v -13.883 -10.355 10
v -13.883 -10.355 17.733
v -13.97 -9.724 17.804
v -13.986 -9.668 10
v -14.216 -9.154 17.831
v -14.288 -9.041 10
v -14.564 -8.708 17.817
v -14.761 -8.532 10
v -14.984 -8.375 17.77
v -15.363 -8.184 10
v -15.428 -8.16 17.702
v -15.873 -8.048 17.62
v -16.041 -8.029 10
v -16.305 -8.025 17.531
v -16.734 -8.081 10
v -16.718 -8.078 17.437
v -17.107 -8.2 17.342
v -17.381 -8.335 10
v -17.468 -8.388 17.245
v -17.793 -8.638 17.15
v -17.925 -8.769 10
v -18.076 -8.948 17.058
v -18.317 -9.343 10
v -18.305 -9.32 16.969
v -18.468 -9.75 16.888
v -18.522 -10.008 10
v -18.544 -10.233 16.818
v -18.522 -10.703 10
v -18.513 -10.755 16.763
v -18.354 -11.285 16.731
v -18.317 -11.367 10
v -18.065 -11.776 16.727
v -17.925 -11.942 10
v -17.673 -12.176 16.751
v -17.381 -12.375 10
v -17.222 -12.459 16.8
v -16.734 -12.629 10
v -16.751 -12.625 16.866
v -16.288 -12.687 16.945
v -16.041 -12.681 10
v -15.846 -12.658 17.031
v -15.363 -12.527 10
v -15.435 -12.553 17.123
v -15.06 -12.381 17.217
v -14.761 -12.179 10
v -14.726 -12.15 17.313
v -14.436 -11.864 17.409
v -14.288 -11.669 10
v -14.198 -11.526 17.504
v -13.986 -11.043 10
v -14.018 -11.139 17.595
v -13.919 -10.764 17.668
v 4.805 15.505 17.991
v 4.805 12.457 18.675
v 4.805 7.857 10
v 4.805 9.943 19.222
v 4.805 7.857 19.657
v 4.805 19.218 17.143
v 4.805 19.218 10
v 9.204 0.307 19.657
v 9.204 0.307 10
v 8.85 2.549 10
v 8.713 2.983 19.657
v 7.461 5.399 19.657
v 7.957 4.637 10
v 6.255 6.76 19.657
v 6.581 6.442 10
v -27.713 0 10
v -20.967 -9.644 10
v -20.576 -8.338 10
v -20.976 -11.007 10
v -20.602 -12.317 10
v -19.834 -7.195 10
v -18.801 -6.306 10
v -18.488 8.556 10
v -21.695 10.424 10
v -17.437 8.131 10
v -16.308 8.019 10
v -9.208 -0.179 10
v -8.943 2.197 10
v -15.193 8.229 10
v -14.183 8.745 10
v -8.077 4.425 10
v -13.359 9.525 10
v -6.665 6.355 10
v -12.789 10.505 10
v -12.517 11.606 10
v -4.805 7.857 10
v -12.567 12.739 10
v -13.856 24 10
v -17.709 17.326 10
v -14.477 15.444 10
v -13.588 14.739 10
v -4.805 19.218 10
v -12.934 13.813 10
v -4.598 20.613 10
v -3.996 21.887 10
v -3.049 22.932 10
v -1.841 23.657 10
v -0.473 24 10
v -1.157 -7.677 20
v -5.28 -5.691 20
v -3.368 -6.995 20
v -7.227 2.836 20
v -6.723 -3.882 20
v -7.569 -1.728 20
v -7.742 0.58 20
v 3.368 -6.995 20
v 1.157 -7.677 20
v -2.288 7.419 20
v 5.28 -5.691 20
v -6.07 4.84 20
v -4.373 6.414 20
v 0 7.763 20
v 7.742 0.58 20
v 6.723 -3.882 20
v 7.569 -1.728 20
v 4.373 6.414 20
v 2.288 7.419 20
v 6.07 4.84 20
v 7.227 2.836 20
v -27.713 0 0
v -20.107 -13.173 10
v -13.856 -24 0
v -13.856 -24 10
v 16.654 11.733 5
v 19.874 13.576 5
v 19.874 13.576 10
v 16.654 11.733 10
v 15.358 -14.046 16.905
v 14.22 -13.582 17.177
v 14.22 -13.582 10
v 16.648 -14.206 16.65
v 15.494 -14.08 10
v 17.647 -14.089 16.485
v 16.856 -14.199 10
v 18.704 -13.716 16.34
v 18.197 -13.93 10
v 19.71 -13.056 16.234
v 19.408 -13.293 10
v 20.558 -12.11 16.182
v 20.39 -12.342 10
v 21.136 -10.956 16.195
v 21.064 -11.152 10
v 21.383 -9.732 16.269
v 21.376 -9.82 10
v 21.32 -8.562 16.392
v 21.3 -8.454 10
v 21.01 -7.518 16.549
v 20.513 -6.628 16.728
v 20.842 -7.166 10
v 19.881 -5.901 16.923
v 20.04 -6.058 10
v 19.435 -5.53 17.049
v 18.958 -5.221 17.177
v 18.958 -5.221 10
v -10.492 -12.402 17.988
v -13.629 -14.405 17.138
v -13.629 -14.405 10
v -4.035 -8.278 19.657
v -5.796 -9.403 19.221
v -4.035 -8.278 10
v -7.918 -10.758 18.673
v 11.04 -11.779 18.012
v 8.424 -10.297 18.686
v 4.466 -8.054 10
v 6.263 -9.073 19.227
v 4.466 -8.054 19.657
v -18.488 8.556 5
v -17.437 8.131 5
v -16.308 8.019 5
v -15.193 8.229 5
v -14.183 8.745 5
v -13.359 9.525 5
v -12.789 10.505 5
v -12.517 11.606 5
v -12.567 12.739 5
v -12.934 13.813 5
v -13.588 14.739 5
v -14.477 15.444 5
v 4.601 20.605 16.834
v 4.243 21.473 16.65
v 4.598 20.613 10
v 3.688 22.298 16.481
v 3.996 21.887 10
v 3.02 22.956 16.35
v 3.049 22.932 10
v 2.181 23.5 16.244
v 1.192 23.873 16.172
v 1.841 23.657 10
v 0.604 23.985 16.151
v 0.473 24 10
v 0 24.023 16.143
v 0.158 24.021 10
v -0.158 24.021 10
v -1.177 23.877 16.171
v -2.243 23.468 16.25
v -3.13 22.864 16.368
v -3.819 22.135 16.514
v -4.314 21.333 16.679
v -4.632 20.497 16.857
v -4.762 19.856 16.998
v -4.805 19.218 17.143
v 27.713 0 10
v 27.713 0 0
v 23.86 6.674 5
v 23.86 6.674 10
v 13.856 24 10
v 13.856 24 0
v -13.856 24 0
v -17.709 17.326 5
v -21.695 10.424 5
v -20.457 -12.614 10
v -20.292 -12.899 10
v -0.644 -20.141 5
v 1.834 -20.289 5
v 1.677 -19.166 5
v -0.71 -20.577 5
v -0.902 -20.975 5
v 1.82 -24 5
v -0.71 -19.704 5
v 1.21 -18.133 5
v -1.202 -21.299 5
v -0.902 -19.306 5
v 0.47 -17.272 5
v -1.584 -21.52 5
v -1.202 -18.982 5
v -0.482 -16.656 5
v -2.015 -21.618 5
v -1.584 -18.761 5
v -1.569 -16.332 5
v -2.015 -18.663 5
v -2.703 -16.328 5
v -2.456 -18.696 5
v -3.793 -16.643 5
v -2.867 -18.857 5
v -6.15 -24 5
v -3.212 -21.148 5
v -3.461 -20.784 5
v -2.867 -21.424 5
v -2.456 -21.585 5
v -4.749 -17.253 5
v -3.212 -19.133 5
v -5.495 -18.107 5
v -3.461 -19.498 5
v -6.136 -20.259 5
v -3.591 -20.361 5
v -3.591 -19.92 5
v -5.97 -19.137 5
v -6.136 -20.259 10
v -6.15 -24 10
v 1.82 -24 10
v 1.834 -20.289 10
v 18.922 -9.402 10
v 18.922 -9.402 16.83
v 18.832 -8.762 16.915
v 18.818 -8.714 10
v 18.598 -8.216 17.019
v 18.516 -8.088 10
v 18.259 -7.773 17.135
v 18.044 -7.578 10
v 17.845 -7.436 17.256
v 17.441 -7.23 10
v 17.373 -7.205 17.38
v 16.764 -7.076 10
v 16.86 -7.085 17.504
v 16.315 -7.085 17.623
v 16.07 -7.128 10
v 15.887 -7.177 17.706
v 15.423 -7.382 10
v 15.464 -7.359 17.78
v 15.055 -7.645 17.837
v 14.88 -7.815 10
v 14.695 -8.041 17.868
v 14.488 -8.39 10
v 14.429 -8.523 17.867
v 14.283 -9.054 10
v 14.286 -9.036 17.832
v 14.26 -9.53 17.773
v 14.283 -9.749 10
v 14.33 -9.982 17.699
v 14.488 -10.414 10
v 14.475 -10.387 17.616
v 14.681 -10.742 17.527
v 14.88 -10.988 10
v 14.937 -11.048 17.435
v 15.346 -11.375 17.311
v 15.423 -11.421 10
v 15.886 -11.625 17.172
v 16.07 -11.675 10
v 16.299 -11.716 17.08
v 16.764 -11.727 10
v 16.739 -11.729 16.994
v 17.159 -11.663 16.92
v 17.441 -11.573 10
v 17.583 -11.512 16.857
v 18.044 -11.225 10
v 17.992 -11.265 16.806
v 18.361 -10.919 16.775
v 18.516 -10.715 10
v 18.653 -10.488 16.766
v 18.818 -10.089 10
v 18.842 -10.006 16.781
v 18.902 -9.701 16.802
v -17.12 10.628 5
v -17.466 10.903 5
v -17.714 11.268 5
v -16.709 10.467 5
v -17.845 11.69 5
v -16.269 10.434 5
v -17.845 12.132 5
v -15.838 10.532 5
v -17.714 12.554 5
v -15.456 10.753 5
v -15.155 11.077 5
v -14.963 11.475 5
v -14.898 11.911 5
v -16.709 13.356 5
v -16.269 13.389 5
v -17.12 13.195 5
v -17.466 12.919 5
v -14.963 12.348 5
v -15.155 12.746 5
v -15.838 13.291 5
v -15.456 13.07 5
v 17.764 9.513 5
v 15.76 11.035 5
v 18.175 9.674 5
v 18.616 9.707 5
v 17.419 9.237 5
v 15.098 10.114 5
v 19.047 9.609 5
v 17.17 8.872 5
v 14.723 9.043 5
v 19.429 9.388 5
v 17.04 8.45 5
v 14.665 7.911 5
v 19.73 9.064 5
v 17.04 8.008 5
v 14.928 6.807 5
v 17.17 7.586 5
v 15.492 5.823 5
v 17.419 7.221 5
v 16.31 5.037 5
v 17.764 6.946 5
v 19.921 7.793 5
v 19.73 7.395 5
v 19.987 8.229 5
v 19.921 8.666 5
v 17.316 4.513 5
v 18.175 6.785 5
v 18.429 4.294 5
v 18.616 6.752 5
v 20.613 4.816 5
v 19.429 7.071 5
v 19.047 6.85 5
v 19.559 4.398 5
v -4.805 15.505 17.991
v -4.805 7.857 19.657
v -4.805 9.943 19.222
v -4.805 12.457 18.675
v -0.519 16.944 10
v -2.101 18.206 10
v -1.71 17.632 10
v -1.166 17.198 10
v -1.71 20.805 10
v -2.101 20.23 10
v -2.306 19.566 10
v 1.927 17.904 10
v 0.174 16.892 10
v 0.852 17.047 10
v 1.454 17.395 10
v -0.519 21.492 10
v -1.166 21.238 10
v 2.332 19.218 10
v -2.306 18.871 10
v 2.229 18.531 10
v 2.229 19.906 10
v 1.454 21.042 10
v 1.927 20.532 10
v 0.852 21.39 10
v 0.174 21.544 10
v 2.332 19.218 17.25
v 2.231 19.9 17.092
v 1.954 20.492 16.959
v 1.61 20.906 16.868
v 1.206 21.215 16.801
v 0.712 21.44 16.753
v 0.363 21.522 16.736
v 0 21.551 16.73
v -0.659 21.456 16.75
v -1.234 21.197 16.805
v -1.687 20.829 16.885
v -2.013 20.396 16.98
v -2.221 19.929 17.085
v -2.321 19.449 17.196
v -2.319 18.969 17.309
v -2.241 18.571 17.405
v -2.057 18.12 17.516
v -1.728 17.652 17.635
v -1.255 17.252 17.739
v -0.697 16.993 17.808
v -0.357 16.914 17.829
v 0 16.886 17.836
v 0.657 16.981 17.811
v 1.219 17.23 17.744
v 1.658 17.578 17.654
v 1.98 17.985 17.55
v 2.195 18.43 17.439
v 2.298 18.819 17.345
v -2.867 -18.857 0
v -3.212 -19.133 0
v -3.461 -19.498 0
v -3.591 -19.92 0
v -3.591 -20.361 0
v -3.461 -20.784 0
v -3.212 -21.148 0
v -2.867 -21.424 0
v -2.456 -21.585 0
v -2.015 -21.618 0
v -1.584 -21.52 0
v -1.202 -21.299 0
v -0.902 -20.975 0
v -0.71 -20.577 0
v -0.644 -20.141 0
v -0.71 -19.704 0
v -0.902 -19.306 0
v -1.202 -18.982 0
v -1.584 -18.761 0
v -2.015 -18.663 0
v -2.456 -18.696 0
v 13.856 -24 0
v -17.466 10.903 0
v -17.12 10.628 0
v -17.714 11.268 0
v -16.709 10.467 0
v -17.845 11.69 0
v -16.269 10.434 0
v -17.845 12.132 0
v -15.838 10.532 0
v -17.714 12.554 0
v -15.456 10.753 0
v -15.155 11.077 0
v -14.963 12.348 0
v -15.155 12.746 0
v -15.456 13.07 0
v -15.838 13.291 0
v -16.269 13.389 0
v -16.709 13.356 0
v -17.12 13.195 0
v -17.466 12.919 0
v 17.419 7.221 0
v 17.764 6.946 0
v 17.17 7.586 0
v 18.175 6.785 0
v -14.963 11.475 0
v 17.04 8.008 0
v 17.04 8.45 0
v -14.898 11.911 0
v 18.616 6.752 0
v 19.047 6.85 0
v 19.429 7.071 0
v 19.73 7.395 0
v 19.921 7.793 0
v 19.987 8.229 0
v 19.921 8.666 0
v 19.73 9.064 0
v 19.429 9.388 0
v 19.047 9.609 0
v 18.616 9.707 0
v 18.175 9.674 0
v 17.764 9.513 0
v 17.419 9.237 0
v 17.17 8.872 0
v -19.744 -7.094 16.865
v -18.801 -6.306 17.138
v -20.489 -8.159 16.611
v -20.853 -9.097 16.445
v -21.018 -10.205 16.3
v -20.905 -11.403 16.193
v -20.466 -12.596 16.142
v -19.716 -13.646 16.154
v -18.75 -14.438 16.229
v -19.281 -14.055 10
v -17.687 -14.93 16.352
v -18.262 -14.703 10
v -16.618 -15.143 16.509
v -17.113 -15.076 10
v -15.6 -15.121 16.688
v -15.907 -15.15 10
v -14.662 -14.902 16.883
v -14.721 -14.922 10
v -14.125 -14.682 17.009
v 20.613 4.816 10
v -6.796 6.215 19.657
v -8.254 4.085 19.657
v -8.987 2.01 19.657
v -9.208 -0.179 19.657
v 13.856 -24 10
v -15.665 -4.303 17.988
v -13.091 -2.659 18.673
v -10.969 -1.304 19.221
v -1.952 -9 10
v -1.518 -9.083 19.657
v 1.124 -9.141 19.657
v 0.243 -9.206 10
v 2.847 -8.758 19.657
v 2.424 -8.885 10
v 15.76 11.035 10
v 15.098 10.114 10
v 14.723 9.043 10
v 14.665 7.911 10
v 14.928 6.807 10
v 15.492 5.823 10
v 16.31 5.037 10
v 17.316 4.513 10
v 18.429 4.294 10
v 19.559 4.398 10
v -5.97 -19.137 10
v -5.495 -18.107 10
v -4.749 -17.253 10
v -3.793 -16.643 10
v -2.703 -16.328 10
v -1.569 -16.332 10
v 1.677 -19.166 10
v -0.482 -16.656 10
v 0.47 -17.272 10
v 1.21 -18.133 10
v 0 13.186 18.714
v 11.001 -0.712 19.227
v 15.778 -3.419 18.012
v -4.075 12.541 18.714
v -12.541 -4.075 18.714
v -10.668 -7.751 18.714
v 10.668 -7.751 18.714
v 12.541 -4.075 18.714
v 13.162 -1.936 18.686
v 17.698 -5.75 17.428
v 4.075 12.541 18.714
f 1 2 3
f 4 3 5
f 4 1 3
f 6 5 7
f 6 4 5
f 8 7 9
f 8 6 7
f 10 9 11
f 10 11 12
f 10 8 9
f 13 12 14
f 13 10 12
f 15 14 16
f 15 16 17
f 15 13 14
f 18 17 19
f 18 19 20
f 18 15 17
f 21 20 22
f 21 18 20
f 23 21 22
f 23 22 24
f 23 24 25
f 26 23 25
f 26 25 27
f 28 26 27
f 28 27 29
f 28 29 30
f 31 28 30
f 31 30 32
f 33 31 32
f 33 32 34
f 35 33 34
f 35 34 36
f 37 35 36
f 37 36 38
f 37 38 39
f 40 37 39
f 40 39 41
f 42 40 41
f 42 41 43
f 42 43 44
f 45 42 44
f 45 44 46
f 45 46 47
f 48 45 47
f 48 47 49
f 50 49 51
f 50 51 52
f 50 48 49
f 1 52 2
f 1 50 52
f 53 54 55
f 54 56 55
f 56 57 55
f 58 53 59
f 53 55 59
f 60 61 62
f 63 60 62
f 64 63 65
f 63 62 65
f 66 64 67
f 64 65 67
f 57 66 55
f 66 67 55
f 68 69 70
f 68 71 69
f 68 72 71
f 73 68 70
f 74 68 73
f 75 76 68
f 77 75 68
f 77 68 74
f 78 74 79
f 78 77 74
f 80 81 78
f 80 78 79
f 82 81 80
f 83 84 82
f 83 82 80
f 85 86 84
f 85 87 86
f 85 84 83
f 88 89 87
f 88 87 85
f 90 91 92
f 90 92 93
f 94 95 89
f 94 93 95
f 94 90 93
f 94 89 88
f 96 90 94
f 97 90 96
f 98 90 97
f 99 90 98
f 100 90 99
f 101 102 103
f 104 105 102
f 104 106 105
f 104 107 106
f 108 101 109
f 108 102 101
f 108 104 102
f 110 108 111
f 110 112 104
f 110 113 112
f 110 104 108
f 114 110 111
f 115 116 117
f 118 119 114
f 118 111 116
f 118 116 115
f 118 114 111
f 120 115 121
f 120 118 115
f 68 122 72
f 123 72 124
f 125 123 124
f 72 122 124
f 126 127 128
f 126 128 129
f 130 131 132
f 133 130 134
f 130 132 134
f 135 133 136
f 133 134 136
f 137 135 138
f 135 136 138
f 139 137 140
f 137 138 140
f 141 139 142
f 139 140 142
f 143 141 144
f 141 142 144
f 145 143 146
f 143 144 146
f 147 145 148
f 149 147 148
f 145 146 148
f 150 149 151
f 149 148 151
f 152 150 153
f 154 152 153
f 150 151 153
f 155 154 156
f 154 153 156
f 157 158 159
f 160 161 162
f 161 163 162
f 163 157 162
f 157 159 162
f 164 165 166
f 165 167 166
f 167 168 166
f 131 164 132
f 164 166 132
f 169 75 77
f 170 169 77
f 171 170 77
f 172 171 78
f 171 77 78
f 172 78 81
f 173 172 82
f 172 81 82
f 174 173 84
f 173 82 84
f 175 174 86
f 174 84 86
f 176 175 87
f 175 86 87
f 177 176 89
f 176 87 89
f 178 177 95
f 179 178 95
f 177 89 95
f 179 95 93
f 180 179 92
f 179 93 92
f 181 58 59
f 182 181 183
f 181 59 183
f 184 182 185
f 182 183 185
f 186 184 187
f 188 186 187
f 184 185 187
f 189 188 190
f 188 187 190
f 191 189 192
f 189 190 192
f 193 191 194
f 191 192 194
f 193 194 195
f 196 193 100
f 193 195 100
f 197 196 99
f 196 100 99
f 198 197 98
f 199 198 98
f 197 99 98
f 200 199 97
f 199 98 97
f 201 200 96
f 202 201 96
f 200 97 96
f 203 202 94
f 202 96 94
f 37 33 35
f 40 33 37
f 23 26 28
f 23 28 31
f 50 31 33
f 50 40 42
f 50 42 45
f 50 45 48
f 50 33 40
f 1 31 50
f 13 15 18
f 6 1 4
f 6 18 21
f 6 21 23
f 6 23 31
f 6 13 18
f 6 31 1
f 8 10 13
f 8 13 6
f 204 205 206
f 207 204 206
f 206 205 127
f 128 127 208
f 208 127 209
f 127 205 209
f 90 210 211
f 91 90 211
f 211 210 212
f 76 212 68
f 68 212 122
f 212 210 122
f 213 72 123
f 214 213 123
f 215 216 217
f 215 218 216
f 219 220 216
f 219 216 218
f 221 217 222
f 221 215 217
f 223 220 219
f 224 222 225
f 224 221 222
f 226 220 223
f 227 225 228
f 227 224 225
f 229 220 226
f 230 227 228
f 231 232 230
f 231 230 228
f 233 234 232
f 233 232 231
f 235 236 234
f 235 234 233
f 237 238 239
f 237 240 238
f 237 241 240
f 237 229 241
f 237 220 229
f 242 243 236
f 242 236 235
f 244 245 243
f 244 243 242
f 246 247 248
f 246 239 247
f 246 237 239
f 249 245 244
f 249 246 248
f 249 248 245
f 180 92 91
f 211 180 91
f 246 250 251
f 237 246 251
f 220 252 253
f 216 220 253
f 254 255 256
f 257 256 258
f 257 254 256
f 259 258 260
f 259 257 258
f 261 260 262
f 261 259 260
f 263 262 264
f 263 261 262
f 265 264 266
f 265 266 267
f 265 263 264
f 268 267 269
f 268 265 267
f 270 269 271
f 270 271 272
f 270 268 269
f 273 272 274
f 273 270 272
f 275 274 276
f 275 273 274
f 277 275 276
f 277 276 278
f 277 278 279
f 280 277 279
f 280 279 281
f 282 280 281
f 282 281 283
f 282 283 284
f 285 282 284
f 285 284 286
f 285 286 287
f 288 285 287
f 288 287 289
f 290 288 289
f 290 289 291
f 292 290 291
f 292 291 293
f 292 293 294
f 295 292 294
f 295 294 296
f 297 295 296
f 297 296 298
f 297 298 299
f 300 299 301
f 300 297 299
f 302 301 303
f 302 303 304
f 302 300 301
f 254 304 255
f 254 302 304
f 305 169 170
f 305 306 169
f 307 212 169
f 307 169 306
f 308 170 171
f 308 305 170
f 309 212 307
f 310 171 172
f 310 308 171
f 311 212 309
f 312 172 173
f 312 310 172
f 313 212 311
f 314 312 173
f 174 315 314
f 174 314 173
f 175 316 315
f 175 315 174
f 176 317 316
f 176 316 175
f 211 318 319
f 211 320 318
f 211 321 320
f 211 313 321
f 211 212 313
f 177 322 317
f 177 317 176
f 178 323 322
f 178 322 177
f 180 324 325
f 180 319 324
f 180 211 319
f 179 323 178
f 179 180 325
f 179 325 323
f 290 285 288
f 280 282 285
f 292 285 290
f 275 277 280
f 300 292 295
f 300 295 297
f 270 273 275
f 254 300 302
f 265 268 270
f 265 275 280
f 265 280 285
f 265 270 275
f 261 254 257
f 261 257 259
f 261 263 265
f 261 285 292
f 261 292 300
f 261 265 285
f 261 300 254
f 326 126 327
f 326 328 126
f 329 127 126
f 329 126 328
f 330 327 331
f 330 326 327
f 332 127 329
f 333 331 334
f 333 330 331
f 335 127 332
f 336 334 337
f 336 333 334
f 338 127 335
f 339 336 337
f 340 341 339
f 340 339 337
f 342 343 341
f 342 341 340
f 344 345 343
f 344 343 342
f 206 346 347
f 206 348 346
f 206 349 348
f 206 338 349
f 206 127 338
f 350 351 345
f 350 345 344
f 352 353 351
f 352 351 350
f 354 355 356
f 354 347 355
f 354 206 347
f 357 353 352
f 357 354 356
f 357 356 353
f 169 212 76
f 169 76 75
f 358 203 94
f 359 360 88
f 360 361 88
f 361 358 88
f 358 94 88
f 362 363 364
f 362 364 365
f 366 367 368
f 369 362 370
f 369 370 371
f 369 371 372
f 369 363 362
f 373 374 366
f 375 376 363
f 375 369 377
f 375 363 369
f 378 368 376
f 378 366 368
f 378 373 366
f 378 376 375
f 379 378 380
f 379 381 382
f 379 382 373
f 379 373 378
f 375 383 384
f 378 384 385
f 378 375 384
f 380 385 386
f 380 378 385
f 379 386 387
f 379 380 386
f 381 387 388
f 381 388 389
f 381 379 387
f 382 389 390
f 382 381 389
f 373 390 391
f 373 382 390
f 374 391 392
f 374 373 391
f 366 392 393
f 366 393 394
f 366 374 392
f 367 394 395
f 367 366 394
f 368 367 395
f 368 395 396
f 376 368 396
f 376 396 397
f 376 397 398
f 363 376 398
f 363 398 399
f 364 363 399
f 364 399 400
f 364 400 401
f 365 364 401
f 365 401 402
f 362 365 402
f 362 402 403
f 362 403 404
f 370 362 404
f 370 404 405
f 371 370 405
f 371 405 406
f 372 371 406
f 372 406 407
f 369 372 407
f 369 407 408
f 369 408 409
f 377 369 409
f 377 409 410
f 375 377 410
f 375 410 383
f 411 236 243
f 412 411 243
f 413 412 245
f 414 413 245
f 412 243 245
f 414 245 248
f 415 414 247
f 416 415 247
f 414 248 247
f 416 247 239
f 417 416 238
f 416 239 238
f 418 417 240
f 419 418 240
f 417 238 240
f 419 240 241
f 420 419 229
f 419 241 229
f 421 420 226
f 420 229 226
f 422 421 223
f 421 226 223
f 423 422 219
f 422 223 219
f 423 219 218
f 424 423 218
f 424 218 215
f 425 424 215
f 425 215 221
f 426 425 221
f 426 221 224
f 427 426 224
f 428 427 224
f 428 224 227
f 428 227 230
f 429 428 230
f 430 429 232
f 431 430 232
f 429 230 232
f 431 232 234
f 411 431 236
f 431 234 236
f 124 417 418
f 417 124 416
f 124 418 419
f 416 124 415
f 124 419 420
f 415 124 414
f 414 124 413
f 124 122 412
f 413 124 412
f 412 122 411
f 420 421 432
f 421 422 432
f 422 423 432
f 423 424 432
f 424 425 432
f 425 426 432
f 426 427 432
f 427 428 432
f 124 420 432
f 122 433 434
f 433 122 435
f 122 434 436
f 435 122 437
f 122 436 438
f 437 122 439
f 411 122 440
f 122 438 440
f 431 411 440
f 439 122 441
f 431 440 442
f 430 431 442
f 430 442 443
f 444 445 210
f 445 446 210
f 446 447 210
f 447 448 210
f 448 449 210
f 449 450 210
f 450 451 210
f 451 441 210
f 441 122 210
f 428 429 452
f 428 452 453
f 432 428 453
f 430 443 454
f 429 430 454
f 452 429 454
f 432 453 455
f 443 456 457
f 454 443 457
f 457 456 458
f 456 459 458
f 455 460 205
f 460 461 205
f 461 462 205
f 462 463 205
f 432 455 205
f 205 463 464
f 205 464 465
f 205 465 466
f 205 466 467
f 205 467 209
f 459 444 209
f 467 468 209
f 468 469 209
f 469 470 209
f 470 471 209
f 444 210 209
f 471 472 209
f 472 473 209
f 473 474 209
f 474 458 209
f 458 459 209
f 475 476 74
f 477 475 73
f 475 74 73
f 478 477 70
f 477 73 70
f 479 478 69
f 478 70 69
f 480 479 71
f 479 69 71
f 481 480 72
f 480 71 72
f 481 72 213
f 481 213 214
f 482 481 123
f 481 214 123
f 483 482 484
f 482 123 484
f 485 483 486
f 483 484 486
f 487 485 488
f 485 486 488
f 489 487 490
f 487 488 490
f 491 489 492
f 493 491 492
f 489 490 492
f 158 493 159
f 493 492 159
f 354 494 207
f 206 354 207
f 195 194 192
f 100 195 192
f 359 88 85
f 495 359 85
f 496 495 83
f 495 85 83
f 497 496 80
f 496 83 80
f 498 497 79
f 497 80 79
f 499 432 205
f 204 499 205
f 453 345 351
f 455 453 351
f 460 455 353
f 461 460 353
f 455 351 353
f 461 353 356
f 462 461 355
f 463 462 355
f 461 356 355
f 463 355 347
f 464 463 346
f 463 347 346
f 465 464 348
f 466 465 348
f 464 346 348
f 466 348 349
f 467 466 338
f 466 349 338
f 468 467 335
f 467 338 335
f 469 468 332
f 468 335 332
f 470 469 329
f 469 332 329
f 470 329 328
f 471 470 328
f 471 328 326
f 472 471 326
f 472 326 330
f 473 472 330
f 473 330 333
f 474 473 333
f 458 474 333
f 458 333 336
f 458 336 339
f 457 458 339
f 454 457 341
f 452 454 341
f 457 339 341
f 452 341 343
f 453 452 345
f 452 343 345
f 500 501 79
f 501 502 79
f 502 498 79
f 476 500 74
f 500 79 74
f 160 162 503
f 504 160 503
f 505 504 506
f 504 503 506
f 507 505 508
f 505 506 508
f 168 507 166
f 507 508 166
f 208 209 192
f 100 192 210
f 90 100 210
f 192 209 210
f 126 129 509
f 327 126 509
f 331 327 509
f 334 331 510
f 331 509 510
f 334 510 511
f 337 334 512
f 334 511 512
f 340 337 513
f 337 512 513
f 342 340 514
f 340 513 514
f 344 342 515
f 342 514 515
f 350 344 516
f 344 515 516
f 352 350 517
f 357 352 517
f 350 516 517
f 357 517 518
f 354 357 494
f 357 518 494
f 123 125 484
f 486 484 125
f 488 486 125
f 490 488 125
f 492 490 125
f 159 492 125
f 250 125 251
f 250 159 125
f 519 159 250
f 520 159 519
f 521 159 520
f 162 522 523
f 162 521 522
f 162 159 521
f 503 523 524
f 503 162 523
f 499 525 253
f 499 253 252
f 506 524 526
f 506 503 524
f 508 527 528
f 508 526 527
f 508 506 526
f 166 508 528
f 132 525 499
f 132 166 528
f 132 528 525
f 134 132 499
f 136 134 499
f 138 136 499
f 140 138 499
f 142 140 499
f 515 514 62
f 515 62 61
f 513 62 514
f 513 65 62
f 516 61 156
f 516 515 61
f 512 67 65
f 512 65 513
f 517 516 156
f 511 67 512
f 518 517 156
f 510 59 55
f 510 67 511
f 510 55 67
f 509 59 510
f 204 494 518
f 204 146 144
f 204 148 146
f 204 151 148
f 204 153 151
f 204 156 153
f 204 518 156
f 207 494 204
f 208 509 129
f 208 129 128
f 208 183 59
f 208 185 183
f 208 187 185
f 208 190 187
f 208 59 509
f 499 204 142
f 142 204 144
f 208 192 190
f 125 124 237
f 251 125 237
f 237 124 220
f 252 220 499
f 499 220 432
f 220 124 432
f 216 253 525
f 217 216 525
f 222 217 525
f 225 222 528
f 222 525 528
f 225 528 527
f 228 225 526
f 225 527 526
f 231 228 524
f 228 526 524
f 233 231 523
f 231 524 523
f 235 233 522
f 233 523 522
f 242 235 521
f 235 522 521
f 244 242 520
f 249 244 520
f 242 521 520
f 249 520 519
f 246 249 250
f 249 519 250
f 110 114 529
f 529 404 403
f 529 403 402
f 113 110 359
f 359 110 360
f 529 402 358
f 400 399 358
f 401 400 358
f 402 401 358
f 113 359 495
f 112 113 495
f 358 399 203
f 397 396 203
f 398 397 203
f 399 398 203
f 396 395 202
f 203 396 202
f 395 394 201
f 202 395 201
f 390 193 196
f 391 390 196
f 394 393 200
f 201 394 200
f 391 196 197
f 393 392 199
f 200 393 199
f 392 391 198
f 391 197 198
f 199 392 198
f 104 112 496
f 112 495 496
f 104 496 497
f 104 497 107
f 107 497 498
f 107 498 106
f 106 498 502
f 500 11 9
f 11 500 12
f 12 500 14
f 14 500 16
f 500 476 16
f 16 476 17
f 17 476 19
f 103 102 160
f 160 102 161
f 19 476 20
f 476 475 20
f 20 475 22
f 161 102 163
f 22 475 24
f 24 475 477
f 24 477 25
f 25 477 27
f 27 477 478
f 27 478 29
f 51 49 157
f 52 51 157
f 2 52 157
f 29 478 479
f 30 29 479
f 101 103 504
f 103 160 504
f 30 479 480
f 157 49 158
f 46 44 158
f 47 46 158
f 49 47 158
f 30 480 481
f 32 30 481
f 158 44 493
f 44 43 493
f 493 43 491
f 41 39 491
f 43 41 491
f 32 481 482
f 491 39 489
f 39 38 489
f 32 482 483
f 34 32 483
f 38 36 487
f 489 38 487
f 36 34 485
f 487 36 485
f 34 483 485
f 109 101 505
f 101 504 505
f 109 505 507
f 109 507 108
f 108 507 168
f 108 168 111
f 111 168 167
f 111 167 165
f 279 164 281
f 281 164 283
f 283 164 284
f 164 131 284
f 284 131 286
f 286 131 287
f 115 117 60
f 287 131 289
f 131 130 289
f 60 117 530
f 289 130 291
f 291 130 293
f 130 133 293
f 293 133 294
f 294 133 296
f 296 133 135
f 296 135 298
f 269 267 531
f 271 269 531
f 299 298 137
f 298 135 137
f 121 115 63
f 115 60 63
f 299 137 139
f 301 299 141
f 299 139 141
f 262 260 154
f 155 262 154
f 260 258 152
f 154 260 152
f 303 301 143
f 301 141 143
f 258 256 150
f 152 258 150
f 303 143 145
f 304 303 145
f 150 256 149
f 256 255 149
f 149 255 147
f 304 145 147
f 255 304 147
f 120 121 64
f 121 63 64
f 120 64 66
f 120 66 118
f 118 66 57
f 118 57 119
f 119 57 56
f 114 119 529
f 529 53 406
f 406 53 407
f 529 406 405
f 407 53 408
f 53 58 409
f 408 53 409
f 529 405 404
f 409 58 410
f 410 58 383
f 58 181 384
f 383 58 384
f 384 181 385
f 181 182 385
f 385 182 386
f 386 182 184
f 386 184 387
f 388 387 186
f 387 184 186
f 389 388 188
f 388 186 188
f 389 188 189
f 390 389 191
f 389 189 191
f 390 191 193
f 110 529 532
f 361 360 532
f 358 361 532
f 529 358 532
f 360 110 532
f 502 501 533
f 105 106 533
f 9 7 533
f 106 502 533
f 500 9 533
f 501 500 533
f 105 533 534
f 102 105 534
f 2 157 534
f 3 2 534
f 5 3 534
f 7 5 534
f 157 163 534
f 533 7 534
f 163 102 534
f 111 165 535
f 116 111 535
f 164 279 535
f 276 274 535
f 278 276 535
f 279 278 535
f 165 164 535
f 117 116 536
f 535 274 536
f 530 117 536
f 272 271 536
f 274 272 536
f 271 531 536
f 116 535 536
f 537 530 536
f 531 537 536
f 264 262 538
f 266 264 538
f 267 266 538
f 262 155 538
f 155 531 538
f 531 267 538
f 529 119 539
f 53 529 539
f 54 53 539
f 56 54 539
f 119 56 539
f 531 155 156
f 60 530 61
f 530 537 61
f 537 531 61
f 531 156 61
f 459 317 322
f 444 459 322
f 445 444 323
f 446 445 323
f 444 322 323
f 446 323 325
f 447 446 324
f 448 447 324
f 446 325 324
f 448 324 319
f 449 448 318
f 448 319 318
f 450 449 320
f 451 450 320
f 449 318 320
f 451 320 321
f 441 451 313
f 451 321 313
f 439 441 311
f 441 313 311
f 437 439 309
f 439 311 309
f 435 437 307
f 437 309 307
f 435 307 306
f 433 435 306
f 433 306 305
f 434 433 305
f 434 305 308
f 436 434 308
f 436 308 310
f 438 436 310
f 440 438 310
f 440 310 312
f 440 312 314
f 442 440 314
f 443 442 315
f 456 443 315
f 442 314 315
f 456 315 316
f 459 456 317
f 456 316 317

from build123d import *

# Parameters (mm, degrees)
PAD_DEPTH          = 10
POCKET_DEPTH       = 5
SKETCH002_R        = 1.481767
POCKET001_DEPTH    = 5
POLARPATTERN_COUNT = 3
SKETCH003_R        = 2.332395
PAD001_DEPTH       = 10


with BuildPart() as part:
    # Sketch → Pad (new body)
    with BuildSketch(Plane.XY):
        Polygon((13.856406, -24), (27.712813, 0), (13.856406, 24), (-13.856406, 24), (-27.712813, 0), (-13.856406, -24), align=None)
    extrude(amount=PAD_DEPTH)

    # Sketch001 (on Face8 of Pad) → Pocket (cut)
    with BuildSketch(Plane.XY.offset(10)):
        with BuildLine():
            ThreePointArc((-18.488317, 8.556219), (-13.038939, 9.994402), (-14.477122, 15.443781))
            Line((-14.477122, 15.443781), (-28.403704, 23.554379))
            ThreePointArc((-28.403704, 23.554379), (-33.853083, 22.116196), (-32.4149, 16.666817))
            Line((-32.4149, 16.666817), (-18.488317, 8.556219))
        make_face()
    pocket = extrude(amount=-POCKET_DEPTH, mode=Mode.SUBTRACT)

    # Sketch002 (on Face12 of Pocket) → Pocket001 (cut)
    with BuildSketch(Plane.XY.offset(5)):
        with Locations((-16.379377, 11.911345)):
            Circle(SKETCH002_R)
    pocket001 = extrude(amount=-POCKET001_DEPTH, mode=Mode.SUBTRACT)

    # PolarPattern: Pocket001, Pocket ×3 about axis
    polarpattern_axis = Axis((0, 0, 5), (0, 0, 1))
    for i in range(1, POLARPATTERN_COUNT):
        add(pocket001.rotate(polarpattern_axis, i * 360 / POLARPATTERN_COUNT), mode=Mode.SUBTRACT)
        add(pocket.rotate(polarpattern_axis, i * 360 / POLARPATTERN_COUNT), mode=Mode.SUBTRACT)

    # Sketch003 (on Face5 of PolarPattern) → Pad001 (join)
    with BuildSketch(Plane.XY.offset(10)):
        with BuildLine():
            ThreePointArc((-4.035282, -8.27825), (0.242823, -9.206191), (4.466063, -8.054017))
            Line((4.466063, -8.054017), (14.220197, -13.581932))
            ThreePointArc((14.220197, -13.581932), (20.76966, -11.770691), (18.958419, -5.221228))
            Line((18.958419, -5.221228), (9.204285, 0.306686))
            ThreePointArc((9.204285, 0.306686), (7.957073, 4.636583), (4.805, 7.856519))
            Line((4.805, 7.856519), (4.805, 19.21837))
            ThreePointArc((4.805, 19.21837), (0, 24.02337), (-4.805, 19.21837))
            Line((-4.805, 19.21837), (-4.805, 7.856519))
            ThreePointArc((-4.805, 7.856519), (-8.076559, 4.425168), (-9.207654, -0.178949))
            Line((-9.207654, -0.178949), (-18.801422, -6.305717))
            ThreePointArc((-18.801422, -6.305717), (-20.264886, -12.941553), (-13.62905, -14.405017))
            Line((-13.62905, -14.405017), (-4.035282, -8.27825))
        make_face()
        with Locations((0, 19.21837)):
            Circle(SKETCH003_R, mode=Mode.SUBTRACT)
        with Locations((-16.215236, -10.355367)):
            Circle(SKETCH003_R, mode=Mode.SUBTRACT)
        with Locations((16.589308, -9.40158)):
            Circle(SKETCH003_R, mode=Mode.SUBTRACT)
    extrude(amount=PAD001_DEPTH)

    # Sketch005 → Groove (revolve, cut)
    with BuildSketch(Plane.YZ):
        Polygon((0, 21.841362), (31.185255, 14.444732), (30.454723, 21.841362), align=None)
    revolve(axis=Axis((0, 0, 0), (0, 0, 1)), mode=Mode.SUBTRACT)


solid = part.part
